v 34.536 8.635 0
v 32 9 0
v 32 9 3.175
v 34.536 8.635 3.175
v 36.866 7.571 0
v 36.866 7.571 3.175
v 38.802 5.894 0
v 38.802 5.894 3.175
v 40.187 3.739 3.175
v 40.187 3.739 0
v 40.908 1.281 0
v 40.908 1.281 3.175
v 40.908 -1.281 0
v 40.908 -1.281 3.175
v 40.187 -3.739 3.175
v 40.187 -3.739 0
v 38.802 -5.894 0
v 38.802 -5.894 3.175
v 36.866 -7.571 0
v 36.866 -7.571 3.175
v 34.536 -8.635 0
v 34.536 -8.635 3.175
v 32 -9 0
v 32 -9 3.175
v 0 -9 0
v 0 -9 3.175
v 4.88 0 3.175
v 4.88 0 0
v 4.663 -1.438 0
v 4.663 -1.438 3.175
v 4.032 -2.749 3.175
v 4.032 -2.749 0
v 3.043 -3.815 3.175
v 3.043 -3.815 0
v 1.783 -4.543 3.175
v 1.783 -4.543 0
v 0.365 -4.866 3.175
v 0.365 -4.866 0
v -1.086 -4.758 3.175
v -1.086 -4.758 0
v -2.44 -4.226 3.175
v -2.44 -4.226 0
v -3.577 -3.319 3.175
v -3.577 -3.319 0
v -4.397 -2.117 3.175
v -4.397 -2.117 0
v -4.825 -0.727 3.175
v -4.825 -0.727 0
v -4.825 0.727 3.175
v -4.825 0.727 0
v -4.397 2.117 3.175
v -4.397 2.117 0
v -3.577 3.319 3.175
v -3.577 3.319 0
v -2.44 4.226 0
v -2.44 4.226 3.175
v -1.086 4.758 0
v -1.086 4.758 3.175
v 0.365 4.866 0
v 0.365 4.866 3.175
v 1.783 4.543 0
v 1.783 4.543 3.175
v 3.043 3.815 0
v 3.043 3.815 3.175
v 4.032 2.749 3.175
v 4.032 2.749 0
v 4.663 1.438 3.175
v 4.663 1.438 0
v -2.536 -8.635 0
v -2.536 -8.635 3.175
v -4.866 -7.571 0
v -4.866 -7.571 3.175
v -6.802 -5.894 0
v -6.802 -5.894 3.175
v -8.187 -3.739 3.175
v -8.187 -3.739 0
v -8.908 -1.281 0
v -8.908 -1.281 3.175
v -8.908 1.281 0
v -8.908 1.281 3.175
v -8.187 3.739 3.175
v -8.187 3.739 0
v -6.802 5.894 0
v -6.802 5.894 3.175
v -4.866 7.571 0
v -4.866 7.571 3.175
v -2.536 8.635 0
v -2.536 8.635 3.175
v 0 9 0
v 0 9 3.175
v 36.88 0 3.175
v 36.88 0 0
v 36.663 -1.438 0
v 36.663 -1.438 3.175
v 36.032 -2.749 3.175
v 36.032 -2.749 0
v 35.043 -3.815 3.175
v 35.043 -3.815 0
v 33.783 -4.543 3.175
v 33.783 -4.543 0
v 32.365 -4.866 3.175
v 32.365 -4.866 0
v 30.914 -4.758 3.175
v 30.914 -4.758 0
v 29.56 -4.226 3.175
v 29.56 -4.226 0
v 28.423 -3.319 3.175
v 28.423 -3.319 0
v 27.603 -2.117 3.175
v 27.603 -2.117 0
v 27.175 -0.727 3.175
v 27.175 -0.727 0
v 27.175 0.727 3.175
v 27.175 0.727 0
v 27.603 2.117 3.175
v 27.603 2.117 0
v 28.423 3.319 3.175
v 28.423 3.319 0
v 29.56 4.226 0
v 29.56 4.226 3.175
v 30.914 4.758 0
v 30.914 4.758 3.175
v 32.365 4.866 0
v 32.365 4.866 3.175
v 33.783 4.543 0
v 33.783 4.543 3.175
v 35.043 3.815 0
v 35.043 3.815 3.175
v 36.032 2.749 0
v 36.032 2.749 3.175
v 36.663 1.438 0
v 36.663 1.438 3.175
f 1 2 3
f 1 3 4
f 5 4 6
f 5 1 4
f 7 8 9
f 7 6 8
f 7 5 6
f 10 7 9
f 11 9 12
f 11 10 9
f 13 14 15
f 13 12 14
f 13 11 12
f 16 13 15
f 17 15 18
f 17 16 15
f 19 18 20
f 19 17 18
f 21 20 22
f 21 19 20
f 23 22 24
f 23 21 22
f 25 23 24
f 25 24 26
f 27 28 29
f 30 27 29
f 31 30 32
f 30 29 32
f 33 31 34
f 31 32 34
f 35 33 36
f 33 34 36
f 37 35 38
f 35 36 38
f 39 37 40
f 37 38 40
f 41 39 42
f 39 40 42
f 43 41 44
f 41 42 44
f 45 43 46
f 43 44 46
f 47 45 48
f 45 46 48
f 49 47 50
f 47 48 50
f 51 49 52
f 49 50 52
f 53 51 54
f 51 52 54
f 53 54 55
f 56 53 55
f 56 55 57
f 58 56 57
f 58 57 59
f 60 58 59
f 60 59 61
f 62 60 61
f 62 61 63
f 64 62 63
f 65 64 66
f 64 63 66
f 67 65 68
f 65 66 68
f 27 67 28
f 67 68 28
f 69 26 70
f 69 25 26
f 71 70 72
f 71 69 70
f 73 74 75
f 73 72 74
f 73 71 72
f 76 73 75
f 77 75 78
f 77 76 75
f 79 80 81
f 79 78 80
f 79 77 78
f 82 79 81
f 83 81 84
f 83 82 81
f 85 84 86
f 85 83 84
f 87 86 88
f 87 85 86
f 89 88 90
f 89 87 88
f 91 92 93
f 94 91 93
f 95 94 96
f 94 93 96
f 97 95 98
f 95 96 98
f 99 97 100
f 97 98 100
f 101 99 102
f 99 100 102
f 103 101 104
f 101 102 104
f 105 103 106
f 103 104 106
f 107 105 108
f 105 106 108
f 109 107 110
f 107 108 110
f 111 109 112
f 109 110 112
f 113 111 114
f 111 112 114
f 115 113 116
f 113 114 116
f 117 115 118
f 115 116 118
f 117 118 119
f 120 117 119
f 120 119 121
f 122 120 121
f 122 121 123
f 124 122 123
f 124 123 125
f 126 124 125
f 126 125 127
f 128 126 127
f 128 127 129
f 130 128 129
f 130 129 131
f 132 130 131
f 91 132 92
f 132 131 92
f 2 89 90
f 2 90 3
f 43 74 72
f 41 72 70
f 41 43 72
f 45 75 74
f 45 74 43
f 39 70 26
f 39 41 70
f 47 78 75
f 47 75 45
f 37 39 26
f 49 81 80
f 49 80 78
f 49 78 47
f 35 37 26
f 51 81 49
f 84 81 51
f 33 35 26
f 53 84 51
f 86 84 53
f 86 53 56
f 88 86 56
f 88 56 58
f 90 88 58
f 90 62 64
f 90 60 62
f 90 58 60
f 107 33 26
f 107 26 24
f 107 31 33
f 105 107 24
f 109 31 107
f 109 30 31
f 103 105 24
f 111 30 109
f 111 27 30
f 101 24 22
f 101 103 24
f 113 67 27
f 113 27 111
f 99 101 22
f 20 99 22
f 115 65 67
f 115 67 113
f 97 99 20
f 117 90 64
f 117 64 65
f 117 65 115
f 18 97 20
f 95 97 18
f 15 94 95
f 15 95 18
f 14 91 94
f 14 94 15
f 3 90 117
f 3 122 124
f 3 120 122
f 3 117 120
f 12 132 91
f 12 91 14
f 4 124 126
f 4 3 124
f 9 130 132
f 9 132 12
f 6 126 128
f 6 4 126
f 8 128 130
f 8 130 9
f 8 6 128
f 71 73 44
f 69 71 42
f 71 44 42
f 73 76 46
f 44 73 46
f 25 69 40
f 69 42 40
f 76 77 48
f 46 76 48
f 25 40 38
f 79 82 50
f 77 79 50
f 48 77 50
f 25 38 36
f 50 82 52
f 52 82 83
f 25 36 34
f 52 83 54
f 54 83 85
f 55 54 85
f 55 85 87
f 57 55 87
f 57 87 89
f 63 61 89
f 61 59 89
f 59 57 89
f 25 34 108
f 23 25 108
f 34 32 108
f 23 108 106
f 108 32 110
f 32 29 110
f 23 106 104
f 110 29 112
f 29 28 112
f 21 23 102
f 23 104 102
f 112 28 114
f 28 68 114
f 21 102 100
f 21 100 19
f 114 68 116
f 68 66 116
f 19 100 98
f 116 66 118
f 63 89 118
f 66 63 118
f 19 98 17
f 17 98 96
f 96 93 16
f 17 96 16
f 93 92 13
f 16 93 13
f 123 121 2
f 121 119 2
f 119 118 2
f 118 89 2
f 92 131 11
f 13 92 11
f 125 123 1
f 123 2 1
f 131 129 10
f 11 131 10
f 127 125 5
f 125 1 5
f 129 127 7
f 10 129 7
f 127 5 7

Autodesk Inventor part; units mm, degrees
ref_plane "YZ Plane" through (0, 0, 0) normal (1, 0, 0) x (0, 1, 0)
ref_plane "XZ Plane" through (0, 0, 0) normal (0, 1, 0) x (-1, 0, 0)
ref_plane "XY Plane" through (0, 0, 0) normal (0, 0, 1) x (1, 0, 0)
sketch "Sketch1" plane through (0, 0, 0) normal (0, 0, 1) x (1, 0, 0)
  circle A0 centre (0, 0) radius 4.88
  line L0 (0, 9) -> (32, 9)
  arc A1 (32, -9) -> (32, 9) centre (32, 0) ccw
  line L1 (32, -9) -> (0, -9)
  arc A2 (0, 9) -> (0, -9) centre (0, 0) ccw
  circle A3 centre (32, 0) radius 4.88
  dimension "d0" = 9.76
  dimension "d1" = 9
  dimension "d2" = 32
extrude "Extrusion1" add sketch "Sketch1" along normal blind 3.175
properties part number "tipper_link_A"
